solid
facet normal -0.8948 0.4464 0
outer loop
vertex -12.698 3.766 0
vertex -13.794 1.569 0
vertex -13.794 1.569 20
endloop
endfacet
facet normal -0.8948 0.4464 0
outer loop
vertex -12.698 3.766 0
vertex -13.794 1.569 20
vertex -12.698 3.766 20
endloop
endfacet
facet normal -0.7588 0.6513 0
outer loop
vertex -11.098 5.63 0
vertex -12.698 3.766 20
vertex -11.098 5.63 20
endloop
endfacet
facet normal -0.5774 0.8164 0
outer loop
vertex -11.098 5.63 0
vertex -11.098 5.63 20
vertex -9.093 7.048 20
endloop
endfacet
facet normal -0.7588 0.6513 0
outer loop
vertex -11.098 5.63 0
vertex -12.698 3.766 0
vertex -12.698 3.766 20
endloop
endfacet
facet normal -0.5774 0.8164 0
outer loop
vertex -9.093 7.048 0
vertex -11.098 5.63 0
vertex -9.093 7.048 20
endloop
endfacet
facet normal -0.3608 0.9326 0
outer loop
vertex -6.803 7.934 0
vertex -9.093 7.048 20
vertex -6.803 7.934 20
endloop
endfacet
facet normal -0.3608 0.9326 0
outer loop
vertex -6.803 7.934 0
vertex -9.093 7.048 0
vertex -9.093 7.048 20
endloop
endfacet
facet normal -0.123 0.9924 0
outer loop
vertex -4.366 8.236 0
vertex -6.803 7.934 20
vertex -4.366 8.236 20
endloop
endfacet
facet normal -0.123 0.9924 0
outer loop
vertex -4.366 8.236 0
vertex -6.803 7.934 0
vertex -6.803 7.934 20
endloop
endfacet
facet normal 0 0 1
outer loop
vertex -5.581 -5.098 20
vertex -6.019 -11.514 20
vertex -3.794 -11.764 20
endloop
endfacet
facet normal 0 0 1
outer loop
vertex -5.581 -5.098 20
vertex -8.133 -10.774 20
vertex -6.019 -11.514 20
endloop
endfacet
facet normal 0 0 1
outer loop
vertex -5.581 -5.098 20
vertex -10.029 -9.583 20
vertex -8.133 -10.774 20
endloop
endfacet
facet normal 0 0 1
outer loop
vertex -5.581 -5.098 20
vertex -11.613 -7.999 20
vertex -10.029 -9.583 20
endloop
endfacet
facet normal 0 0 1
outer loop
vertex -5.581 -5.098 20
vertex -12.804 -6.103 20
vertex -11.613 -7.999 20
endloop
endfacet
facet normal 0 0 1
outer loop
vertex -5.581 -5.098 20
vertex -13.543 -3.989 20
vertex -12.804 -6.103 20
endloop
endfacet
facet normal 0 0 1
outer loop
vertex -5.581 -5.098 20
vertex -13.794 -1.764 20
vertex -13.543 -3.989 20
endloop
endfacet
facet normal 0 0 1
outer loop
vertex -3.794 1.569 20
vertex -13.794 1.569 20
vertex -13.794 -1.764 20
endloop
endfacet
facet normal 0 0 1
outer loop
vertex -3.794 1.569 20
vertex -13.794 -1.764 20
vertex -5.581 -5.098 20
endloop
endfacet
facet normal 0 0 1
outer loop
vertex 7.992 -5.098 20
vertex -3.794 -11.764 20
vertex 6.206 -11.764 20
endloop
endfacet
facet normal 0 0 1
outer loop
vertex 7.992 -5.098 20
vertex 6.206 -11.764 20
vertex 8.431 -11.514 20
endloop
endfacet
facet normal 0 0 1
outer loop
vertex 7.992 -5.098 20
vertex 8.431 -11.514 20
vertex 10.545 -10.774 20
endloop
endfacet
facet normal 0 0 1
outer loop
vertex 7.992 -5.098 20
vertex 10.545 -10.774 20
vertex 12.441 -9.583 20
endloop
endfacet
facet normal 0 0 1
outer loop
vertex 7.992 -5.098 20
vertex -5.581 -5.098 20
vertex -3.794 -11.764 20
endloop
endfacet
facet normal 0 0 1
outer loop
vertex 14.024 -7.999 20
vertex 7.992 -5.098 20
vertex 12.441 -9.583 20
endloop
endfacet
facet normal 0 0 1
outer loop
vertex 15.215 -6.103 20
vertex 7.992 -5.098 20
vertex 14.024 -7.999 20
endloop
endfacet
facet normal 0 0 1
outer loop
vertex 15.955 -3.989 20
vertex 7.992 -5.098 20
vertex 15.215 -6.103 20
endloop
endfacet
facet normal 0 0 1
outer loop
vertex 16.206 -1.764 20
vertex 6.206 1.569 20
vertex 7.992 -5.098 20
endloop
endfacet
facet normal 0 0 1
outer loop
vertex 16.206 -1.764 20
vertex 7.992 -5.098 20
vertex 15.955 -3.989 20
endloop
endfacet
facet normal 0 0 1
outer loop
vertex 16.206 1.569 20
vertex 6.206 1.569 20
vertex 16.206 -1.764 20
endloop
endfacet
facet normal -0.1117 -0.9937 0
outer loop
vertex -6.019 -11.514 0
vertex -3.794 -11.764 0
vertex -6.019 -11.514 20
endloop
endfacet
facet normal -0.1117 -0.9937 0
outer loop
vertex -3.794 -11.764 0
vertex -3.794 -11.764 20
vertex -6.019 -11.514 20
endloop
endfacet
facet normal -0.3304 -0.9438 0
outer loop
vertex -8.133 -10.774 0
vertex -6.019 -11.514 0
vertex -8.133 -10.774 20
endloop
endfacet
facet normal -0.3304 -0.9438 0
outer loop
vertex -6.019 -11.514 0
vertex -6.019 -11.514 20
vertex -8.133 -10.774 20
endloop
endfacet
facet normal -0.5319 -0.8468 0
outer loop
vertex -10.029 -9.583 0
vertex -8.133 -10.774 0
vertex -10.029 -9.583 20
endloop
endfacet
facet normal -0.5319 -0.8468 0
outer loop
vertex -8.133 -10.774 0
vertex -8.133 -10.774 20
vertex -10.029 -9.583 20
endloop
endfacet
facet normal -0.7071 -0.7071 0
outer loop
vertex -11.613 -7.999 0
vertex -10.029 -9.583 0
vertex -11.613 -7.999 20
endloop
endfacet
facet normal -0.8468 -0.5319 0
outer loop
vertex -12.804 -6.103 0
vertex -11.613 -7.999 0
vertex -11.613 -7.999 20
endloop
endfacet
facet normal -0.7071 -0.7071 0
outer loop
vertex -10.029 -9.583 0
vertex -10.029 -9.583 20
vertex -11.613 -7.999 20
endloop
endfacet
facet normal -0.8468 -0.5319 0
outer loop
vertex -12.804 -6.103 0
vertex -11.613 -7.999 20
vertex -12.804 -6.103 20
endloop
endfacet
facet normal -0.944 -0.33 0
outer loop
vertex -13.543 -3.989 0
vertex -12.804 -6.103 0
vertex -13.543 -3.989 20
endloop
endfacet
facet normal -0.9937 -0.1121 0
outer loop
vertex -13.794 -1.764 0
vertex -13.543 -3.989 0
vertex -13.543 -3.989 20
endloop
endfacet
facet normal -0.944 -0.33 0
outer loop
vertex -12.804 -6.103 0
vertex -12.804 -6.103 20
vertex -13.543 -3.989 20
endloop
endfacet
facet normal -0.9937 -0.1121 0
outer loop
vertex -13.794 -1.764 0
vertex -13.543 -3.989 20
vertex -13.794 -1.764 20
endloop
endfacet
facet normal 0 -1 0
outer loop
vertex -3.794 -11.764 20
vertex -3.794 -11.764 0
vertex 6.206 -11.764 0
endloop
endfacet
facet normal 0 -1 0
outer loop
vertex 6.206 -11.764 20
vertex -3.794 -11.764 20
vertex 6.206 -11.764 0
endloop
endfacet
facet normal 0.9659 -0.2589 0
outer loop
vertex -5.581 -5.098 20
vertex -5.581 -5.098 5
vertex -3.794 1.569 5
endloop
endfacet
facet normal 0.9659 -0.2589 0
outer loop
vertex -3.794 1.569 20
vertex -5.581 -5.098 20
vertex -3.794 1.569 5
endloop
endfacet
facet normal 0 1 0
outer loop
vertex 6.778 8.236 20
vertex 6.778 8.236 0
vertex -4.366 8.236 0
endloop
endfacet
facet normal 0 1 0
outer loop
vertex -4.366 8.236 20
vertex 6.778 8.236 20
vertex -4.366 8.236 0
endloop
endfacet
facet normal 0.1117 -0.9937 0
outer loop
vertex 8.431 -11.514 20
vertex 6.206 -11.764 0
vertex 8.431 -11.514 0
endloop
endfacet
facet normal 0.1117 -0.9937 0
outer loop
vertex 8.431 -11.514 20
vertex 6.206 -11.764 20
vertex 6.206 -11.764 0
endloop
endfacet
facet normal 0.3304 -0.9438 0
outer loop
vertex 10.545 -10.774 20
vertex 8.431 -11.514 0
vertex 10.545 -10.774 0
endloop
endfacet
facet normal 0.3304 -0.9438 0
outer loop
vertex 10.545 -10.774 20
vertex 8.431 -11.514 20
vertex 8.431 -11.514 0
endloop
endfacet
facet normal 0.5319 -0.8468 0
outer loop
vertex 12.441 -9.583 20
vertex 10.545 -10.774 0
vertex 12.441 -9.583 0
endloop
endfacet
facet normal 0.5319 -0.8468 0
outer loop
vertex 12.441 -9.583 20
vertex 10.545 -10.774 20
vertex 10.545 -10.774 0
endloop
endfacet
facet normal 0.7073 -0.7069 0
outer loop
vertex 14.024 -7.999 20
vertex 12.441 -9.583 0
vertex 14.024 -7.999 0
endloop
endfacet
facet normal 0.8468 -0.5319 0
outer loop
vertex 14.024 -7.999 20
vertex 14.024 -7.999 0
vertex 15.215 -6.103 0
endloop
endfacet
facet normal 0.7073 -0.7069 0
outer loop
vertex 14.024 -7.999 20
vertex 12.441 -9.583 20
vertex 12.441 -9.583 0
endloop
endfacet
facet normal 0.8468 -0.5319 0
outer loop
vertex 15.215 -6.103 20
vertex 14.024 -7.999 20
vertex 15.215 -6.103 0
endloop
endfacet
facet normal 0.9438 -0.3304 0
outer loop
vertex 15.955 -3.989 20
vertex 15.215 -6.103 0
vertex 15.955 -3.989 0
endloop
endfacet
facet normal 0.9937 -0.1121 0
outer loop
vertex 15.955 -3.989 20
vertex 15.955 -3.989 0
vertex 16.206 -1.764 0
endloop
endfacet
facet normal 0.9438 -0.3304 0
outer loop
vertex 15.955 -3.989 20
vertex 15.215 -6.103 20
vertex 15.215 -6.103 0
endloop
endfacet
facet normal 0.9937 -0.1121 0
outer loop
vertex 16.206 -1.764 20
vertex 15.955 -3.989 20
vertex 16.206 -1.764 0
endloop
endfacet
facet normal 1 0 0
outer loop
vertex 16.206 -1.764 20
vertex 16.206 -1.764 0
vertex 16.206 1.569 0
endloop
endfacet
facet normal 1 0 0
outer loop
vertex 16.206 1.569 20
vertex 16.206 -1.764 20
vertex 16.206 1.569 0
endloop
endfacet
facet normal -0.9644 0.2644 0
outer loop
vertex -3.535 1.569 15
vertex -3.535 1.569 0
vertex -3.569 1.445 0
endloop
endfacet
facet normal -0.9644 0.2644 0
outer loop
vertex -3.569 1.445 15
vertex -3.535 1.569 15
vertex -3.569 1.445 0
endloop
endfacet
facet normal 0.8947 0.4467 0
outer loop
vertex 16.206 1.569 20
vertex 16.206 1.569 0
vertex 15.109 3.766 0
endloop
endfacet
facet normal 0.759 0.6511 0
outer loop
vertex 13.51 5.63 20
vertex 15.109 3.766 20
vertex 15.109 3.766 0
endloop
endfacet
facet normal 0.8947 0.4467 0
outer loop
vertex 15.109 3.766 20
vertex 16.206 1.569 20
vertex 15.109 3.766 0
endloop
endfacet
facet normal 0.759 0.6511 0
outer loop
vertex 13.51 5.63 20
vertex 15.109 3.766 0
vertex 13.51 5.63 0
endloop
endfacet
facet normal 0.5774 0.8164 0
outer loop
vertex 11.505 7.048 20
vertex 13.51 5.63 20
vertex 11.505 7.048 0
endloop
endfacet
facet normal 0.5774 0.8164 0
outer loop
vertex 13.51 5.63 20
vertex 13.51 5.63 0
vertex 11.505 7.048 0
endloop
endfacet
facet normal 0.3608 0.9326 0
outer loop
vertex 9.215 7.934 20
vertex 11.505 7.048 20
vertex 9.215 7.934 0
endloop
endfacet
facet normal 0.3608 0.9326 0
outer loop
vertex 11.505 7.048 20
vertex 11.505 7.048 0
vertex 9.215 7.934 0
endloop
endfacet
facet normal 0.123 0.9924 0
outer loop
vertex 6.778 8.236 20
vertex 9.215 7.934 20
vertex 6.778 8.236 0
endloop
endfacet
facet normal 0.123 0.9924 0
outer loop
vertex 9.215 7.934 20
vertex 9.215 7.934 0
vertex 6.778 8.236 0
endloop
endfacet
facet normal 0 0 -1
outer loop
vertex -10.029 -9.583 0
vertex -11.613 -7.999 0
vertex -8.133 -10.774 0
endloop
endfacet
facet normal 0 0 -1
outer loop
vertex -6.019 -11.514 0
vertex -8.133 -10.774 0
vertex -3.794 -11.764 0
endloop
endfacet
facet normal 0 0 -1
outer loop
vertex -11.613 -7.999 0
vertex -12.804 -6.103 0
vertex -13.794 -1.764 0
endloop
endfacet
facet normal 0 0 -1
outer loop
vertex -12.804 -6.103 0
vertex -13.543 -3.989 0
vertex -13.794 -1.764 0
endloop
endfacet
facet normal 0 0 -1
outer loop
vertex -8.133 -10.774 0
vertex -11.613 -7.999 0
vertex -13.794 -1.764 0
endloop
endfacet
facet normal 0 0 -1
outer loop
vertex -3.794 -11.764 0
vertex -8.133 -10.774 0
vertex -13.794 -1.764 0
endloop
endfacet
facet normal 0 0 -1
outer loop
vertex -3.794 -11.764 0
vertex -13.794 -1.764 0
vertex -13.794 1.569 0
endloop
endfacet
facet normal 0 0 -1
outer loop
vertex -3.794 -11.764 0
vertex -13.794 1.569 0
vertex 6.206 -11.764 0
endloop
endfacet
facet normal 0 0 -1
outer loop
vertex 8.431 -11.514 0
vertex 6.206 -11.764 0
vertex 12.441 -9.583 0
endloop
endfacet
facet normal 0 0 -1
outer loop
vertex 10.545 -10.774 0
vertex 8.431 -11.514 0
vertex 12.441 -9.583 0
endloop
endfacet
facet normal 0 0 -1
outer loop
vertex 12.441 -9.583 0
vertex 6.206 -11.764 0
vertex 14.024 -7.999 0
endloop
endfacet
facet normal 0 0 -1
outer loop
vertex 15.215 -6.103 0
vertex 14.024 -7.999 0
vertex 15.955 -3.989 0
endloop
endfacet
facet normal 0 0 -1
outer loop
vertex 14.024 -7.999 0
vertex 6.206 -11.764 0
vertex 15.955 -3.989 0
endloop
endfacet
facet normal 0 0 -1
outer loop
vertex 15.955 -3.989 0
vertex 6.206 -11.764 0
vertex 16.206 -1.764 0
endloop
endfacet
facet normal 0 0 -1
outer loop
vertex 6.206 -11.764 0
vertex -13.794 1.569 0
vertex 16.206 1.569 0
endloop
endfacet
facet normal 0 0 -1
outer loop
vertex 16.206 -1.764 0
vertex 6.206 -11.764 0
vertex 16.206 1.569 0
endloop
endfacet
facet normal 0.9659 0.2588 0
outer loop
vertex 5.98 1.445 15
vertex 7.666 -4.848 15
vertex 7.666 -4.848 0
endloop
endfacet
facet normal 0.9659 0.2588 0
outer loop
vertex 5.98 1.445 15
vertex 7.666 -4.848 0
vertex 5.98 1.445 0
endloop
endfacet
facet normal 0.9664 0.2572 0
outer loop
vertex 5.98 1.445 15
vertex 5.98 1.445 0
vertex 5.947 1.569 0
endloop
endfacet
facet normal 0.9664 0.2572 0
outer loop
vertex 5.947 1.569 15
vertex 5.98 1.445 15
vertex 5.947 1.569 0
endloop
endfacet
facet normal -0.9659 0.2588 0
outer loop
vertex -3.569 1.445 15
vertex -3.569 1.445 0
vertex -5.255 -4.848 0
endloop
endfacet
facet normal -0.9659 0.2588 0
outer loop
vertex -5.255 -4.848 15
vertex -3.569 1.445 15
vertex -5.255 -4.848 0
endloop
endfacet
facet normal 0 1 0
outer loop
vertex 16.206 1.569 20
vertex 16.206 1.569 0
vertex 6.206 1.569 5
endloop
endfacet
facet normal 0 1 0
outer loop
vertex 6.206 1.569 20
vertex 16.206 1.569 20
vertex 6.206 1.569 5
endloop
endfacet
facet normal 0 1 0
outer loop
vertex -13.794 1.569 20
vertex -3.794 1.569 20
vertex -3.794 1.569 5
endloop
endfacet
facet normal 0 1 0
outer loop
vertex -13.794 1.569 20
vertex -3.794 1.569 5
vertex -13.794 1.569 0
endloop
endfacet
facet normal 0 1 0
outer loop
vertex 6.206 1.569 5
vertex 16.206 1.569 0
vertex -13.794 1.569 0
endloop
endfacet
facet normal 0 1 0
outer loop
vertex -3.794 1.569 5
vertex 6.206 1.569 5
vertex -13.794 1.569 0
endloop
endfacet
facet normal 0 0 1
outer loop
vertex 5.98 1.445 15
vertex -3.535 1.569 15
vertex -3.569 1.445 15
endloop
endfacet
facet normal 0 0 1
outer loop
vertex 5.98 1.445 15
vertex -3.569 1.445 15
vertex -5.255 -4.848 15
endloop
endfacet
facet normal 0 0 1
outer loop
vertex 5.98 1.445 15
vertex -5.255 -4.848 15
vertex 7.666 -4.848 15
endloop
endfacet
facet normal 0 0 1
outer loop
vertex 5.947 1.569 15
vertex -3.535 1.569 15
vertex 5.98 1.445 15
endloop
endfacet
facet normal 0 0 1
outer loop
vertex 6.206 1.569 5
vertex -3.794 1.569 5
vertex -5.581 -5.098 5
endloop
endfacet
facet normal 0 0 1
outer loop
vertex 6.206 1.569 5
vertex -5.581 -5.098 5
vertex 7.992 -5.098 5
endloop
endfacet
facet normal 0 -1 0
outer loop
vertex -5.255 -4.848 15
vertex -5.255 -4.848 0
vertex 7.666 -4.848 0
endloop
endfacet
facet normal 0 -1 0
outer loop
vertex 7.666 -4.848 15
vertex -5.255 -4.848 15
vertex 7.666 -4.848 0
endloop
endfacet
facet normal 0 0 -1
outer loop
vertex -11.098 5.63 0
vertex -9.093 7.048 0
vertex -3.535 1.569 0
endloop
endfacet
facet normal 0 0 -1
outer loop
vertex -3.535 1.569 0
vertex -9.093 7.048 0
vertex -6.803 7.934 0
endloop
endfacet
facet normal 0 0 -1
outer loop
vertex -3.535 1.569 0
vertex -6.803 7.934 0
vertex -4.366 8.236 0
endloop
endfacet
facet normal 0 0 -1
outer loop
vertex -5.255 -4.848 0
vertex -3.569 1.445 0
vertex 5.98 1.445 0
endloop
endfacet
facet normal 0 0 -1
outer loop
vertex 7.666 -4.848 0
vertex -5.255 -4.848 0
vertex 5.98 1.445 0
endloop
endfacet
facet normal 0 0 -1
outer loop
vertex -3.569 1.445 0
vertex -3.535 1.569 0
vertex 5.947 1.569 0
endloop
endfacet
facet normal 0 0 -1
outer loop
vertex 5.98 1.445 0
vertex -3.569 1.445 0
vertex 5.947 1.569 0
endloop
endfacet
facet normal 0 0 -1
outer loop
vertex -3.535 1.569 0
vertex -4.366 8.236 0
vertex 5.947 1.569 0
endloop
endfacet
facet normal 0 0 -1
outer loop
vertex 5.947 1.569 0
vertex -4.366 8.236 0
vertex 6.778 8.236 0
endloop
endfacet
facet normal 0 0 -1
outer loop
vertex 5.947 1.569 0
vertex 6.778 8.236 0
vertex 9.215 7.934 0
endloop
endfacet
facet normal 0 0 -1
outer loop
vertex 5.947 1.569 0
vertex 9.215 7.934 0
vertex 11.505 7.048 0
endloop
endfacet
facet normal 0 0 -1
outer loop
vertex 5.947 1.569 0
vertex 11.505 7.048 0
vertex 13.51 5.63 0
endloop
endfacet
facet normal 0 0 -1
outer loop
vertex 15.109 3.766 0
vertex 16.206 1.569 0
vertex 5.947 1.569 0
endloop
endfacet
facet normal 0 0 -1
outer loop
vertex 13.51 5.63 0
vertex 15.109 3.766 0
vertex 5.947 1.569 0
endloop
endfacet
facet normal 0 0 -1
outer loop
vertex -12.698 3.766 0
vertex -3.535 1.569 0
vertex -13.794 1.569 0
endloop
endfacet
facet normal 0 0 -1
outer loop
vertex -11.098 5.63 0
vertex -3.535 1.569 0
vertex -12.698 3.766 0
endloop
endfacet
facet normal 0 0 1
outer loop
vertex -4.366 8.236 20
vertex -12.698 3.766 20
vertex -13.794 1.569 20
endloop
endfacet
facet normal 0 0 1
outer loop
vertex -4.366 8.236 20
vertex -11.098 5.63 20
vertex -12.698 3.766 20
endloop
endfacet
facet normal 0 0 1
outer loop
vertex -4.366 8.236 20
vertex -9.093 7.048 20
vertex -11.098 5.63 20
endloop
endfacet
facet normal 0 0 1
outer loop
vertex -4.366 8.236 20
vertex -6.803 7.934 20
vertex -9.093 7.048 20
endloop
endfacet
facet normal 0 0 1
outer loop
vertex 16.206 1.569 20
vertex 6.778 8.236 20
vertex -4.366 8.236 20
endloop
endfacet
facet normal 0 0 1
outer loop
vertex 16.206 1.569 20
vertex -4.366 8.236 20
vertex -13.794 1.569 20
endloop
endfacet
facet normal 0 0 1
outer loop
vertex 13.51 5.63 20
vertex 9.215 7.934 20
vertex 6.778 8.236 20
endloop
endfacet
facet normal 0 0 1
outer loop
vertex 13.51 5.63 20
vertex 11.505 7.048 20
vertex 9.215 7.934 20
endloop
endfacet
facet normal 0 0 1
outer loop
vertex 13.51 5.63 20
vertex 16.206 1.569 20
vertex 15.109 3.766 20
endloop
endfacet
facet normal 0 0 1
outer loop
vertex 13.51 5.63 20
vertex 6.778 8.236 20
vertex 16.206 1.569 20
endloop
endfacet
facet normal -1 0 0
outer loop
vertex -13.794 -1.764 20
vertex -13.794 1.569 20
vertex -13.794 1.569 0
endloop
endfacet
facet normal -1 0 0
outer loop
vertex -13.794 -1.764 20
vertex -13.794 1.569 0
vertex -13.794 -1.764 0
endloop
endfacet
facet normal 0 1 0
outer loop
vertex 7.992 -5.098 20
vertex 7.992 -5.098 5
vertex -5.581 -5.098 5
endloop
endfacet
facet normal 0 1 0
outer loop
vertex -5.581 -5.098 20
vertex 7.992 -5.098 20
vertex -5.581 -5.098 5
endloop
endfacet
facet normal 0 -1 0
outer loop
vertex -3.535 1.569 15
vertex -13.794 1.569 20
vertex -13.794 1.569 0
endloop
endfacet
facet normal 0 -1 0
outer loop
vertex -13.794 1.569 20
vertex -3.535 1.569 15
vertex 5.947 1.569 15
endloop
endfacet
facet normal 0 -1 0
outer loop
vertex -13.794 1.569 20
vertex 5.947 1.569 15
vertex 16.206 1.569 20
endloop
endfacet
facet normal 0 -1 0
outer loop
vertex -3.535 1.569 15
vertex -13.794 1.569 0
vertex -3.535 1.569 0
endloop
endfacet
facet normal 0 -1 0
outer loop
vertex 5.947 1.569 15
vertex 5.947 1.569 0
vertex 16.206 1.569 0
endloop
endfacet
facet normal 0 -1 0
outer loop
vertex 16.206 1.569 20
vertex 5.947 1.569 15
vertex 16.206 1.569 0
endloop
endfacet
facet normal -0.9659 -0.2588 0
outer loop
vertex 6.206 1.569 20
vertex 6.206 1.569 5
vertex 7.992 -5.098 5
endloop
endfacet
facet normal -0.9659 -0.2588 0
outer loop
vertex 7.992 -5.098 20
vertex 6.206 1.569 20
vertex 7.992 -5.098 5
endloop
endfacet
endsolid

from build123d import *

# Parameters (mm, degrees)
F2_DEPTH      = 20
F3_DEPTH      = 20
F4_DEPTH      = 15
F5_DEPTH      = 5
F6_F1_R       = 10
F6_F2_R       = 10
F6_2_T1_DEPTH = 67.1404520791


# Not quite as in the source:
# - a fillet or chamfer that OpenCascade refuses, or shapes differently, is made with other operations: its cross-section is extruded or revolved along the edge and cut away or added


with BuildPart() as f2:
    # F1 (on Top) → F2 (new body)
    with BuildSketch(Plane.XY):
        Polygon((16.2058026315, -11.7642522434), (16.2058026315, 1.56908109), (6.2058026315, 1.56908109), (7.992130581, -5.0975855767), (1.2058026315, -5.0975855767), (-5.580525318, -5.0975855767), (-3.7941973685, 1.56908109), (-13.7941973685, 1.56908109), (-13.7941973685, -11.7642522434), align=None)
    extrude(amount=F2_DEPTH)

    # F1 (on Top) → F5 (join)
    with BuildSketch(Plane.XY):
        Polygon((5.980325855, 1.4446460496), (5.9469835864, 1.56908109), (1.2058026315, 1.56908109), (-3.5353783234, 1.56908109), (-3.568720592, 1.4446460496), (-5.2547189748, -4.8475855767), (-2.0442543917, -4.8475855767), (7.6663242378, -4.8475855767), align=None)
        Polygon((7.992130581, -5.0975855767), (6.2058026315, 1.56908109), (5.9469835864, 1.56908109), (5.980325855, 1.4446460496), (7.6663242378, -4.8475855767), (-2.0442543917, -4.8475855767), (-5.2547189748, -4.8475855767), (-3.568720592, 1.4446460496), (-3.5353783234, 1.56908109), (-3.7941973685, 1.56908109), (-5.580525318, -5.0975855767), (1.2058026315, -5.0975855767), align=None)
    extrude(amount=F5_DEPTH)

    # F6: fillet of radius 10 on 2 edges, made by hand

    # F6_f1
    f6_f1_edges = [f2.edges().sort_by_distance(p)[0] for p in [
        (16.2058026315, -11.7642522434, 10),
    ]]
    fillet(f6_f1_edges, radius=F6_F1_R)

    # F6_f2
    f6_f2_edges = [f2.edges().sort_by_distance(p)[0] for p in [
        (-13.7941973685, -11.7642522434, 10),
    ]]
    fillet(f6_f2_edges, radius=F6_F2_R)


with BuildPart() as f3:
    # F1 (on Top) → F3 (new body)
    with BuildSketch(Plane.XY):
        Polygon((6.2058026315, 1.56908109), (16.2058026315, 1.56908109), (16.2058026315, 8.2357477566), (-13.7941973685, 8.2357477566), (-13.7941973685, 1.56908109), (-3.7941973685, 1.56908109), (-3.5353783234, 1.56908109), (1.2058026315, 1.56908109), (5.9469835864, 1.56908109), align=None)
    extrude(amount=F3_DEPTH)

    # F1 (on Top) → F4 (join)
    with BuildSketch(Plane.XY):
        Polygon((5.980325855, 1.4446460496), (5.9469835864, 1.56908109), (1.2058026315, 1.56908109), (-3.5353783234, 1.56908109), (-3.568720592, 1.4446460496), (-5.2547189748, -4.8475855767), (-2.0442543917, -4.8475855767), (7.6663242378, -4.8475855767), align=None)
    extrude(amount=F4_DEPTH)

    # F6#2: fillet of radius 10 on 2 edges, made by hand

    # F6_2_s2 → F6_2_t1 (cut)
    with BuildSketch(Plane.XY.offset(-23.5702260396)):
        with BuildLine():
            ThreePointArc((-13.7941973685, 1.56908109), (-10.1396096446, 6.4007135659), (-4.3661069527, 8.2357477566))
            Line((-4.3661069527, 8.2357477566), (-13.7941973685, 8.2357477566))
            Line((-13.7941973685, 8.2357477566), (-13.7941973685, 1.56908109))
        make_face()
        with BuildLine():
            ThreePointArc((16.2058026315, 1.56908109), (12.5512149076, 6.4007135659), (6.7777122157, 8.2357477566))
            Line((6.7777122157, 8.2357477566), (16.2058026315, 8.2357477566))
            Line((16.2058026315, 8.2357477566), (16.2058026315, 1.56908109))
        make_face()
    extrude(amount=F6_2_T1_DEPTH, mode=Mode.SUBTRACT)


solid = Compound([f2.part, f3.part])
